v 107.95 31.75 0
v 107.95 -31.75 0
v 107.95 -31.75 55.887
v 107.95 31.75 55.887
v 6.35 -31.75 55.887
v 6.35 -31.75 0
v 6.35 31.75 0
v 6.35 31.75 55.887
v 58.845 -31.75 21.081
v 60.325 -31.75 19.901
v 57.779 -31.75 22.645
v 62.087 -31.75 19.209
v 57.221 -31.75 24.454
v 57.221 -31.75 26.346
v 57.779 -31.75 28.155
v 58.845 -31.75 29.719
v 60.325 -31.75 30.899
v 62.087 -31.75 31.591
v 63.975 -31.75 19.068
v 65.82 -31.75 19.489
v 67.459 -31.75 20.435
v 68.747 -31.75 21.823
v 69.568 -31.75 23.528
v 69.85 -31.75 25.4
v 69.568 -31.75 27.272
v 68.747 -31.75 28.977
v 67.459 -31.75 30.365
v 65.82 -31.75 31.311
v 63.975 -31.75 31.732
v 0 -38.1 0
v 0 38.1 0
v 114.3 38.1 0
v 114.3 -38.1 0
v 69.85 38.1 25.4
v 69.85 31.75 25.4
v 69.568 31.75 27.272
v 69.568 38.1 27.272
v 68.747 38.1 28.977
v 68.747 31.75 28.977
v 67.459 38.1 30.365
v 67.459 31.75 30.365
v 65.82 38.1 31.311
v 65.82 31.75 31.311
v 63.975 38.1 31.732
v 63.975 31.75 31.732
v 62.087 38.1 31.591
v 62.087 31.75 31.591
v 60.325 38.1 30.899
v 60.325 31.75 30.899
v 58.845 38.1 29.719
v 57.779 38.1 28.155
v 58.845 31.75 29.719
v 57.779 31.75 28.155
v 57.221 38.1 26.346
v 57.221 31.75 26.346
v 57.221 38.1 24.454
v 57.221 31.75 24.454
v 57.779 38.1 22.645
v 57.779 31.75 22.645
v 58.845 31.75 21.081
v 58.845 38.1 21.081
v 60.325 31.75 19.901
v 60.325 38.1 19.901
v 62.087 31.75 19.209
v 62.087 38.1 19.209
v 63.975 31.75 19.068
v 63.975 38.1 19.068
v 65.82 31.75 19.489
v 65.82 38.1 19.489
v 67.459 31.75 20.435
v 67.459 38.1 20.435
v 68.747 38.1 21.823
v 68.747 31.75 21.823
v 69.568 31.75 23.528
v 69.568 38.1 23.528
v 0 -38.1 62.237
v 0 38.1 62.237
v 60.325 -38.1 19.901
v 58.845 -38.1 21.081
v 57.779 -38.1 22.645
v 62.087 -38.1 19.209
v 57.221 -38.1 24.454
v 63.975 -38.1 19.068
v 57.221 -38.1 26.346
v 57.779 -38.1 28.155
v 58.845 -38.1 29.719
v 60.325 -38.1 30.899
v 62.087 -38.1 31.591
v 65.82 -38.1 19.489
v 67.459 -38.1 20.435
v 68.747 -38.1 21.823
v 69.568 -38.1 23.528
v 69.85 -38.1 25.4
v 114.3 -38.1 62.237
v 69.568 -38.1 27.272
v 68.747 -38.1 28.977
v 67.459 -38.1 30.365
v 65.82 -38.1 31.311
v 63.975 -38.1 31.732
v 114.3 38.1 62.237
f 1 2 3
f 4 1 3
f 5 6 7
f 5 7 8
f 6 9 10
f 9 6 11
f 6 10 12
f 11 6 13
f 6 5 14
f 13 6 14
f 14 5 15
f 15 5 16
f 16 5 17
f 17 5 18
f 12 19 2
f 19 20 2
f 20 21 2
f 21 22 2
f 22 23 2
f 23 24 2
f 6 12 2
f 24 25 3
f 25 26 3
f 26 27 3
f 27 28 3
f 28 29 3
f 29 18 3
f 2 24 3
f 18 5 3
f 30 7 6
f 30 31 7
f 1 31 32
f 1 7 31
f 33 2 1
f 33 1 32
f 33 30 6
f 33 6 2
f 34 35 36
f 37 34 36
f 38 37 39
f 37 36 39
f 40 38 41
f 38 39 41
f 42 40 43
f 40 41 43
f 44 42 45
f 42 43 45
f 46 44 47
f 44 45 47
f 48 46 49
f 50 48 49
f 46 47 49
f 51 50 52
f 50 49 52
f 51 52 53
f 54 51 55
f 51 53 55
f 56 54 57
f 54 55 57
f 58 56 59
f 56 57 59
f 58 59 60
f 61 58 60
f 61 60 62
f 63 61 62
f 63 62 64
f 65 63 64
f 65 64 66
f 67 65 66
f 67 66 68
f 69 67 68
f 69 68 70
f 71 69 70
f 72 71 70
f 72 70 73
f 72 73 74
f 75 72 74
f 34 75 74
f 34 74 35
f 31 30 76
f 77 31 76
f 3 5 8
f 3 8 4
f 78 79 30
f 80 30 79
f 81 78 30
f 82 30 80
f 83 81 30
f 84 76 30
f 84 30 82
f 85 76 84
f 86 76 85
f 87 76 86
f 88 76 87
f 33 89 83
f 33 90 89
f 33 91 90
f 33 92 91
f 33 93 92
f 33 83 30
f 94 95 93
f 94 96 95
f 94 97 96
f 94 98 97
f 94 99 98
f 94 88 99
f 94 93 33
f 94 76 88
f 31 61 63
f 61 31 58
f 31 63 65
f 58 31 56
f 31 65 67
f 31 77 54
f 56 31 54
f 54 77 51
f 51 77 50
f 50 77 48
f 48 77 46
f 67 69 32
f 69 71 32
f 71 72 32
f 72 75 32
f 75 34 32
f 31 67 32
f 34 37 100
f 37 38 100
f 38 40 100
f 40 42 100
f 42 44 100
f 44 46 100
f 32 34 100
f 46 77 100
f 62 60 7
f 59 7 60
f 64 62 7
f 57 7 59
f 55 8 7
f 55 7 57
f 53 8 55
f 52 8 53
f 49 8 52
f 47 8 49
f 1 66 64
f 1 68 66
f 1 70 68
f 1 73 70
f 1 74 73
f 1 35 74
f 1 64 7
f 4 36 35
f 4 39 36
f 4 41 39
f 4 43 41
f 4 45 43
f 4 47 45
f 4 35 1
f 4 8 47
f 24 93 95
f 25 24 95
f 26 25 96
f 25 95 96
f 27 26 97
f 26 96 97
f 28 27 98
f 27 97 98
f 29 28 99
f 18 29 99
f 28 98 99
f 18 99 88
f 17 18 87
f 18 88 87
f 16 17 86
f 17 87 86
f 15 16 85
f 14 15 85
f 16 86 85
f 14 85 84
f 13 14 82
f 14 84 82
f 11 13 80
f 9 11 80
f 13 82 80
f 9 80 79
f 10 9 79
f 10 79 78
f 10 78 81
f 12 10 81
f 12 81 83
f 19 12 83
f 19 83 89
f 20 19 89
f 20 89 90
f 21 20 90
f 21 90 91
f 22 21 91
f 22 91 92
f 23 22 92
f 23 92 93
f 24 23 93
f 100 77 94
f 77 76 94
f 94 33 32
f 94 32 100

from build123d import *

# Parameters (mm, degrees)
F0_W     = 114.3
F0_H     = 62.237151
F1_DEPTH = 38.1
F2_T     = -6.35
F3_R     = 6.35
F4_DEPTH = 76.201


with BuildPart() as f1:
    # F0 (on Front) → F1 (new body, symmetric)
    with BuildSketch(Plane.XZ):
        with Locations((57.15, 31.118575)):
            Rectangle(F0_W, F0_H)
    extrude(amount=F1_DEPTH, both=True)

    # F2
    f2_openings = [f1.faces().sort_by_distance(p)[0] for p in [
        (57.15, 0, 0),
    ]]
    offset(amount=F2_T, openings=f2_openings)

    # F3 (on face) → F4 (cut, through all)
    with BuildSketch(Plane.XZ.offset(38.1)):
        with Locations((63.5, 25.4)):
            Circle(F3_R)
    extrude(amount=-F4_DEPTH, mode=Mode.SUBTRACT)


solid = f1.part
